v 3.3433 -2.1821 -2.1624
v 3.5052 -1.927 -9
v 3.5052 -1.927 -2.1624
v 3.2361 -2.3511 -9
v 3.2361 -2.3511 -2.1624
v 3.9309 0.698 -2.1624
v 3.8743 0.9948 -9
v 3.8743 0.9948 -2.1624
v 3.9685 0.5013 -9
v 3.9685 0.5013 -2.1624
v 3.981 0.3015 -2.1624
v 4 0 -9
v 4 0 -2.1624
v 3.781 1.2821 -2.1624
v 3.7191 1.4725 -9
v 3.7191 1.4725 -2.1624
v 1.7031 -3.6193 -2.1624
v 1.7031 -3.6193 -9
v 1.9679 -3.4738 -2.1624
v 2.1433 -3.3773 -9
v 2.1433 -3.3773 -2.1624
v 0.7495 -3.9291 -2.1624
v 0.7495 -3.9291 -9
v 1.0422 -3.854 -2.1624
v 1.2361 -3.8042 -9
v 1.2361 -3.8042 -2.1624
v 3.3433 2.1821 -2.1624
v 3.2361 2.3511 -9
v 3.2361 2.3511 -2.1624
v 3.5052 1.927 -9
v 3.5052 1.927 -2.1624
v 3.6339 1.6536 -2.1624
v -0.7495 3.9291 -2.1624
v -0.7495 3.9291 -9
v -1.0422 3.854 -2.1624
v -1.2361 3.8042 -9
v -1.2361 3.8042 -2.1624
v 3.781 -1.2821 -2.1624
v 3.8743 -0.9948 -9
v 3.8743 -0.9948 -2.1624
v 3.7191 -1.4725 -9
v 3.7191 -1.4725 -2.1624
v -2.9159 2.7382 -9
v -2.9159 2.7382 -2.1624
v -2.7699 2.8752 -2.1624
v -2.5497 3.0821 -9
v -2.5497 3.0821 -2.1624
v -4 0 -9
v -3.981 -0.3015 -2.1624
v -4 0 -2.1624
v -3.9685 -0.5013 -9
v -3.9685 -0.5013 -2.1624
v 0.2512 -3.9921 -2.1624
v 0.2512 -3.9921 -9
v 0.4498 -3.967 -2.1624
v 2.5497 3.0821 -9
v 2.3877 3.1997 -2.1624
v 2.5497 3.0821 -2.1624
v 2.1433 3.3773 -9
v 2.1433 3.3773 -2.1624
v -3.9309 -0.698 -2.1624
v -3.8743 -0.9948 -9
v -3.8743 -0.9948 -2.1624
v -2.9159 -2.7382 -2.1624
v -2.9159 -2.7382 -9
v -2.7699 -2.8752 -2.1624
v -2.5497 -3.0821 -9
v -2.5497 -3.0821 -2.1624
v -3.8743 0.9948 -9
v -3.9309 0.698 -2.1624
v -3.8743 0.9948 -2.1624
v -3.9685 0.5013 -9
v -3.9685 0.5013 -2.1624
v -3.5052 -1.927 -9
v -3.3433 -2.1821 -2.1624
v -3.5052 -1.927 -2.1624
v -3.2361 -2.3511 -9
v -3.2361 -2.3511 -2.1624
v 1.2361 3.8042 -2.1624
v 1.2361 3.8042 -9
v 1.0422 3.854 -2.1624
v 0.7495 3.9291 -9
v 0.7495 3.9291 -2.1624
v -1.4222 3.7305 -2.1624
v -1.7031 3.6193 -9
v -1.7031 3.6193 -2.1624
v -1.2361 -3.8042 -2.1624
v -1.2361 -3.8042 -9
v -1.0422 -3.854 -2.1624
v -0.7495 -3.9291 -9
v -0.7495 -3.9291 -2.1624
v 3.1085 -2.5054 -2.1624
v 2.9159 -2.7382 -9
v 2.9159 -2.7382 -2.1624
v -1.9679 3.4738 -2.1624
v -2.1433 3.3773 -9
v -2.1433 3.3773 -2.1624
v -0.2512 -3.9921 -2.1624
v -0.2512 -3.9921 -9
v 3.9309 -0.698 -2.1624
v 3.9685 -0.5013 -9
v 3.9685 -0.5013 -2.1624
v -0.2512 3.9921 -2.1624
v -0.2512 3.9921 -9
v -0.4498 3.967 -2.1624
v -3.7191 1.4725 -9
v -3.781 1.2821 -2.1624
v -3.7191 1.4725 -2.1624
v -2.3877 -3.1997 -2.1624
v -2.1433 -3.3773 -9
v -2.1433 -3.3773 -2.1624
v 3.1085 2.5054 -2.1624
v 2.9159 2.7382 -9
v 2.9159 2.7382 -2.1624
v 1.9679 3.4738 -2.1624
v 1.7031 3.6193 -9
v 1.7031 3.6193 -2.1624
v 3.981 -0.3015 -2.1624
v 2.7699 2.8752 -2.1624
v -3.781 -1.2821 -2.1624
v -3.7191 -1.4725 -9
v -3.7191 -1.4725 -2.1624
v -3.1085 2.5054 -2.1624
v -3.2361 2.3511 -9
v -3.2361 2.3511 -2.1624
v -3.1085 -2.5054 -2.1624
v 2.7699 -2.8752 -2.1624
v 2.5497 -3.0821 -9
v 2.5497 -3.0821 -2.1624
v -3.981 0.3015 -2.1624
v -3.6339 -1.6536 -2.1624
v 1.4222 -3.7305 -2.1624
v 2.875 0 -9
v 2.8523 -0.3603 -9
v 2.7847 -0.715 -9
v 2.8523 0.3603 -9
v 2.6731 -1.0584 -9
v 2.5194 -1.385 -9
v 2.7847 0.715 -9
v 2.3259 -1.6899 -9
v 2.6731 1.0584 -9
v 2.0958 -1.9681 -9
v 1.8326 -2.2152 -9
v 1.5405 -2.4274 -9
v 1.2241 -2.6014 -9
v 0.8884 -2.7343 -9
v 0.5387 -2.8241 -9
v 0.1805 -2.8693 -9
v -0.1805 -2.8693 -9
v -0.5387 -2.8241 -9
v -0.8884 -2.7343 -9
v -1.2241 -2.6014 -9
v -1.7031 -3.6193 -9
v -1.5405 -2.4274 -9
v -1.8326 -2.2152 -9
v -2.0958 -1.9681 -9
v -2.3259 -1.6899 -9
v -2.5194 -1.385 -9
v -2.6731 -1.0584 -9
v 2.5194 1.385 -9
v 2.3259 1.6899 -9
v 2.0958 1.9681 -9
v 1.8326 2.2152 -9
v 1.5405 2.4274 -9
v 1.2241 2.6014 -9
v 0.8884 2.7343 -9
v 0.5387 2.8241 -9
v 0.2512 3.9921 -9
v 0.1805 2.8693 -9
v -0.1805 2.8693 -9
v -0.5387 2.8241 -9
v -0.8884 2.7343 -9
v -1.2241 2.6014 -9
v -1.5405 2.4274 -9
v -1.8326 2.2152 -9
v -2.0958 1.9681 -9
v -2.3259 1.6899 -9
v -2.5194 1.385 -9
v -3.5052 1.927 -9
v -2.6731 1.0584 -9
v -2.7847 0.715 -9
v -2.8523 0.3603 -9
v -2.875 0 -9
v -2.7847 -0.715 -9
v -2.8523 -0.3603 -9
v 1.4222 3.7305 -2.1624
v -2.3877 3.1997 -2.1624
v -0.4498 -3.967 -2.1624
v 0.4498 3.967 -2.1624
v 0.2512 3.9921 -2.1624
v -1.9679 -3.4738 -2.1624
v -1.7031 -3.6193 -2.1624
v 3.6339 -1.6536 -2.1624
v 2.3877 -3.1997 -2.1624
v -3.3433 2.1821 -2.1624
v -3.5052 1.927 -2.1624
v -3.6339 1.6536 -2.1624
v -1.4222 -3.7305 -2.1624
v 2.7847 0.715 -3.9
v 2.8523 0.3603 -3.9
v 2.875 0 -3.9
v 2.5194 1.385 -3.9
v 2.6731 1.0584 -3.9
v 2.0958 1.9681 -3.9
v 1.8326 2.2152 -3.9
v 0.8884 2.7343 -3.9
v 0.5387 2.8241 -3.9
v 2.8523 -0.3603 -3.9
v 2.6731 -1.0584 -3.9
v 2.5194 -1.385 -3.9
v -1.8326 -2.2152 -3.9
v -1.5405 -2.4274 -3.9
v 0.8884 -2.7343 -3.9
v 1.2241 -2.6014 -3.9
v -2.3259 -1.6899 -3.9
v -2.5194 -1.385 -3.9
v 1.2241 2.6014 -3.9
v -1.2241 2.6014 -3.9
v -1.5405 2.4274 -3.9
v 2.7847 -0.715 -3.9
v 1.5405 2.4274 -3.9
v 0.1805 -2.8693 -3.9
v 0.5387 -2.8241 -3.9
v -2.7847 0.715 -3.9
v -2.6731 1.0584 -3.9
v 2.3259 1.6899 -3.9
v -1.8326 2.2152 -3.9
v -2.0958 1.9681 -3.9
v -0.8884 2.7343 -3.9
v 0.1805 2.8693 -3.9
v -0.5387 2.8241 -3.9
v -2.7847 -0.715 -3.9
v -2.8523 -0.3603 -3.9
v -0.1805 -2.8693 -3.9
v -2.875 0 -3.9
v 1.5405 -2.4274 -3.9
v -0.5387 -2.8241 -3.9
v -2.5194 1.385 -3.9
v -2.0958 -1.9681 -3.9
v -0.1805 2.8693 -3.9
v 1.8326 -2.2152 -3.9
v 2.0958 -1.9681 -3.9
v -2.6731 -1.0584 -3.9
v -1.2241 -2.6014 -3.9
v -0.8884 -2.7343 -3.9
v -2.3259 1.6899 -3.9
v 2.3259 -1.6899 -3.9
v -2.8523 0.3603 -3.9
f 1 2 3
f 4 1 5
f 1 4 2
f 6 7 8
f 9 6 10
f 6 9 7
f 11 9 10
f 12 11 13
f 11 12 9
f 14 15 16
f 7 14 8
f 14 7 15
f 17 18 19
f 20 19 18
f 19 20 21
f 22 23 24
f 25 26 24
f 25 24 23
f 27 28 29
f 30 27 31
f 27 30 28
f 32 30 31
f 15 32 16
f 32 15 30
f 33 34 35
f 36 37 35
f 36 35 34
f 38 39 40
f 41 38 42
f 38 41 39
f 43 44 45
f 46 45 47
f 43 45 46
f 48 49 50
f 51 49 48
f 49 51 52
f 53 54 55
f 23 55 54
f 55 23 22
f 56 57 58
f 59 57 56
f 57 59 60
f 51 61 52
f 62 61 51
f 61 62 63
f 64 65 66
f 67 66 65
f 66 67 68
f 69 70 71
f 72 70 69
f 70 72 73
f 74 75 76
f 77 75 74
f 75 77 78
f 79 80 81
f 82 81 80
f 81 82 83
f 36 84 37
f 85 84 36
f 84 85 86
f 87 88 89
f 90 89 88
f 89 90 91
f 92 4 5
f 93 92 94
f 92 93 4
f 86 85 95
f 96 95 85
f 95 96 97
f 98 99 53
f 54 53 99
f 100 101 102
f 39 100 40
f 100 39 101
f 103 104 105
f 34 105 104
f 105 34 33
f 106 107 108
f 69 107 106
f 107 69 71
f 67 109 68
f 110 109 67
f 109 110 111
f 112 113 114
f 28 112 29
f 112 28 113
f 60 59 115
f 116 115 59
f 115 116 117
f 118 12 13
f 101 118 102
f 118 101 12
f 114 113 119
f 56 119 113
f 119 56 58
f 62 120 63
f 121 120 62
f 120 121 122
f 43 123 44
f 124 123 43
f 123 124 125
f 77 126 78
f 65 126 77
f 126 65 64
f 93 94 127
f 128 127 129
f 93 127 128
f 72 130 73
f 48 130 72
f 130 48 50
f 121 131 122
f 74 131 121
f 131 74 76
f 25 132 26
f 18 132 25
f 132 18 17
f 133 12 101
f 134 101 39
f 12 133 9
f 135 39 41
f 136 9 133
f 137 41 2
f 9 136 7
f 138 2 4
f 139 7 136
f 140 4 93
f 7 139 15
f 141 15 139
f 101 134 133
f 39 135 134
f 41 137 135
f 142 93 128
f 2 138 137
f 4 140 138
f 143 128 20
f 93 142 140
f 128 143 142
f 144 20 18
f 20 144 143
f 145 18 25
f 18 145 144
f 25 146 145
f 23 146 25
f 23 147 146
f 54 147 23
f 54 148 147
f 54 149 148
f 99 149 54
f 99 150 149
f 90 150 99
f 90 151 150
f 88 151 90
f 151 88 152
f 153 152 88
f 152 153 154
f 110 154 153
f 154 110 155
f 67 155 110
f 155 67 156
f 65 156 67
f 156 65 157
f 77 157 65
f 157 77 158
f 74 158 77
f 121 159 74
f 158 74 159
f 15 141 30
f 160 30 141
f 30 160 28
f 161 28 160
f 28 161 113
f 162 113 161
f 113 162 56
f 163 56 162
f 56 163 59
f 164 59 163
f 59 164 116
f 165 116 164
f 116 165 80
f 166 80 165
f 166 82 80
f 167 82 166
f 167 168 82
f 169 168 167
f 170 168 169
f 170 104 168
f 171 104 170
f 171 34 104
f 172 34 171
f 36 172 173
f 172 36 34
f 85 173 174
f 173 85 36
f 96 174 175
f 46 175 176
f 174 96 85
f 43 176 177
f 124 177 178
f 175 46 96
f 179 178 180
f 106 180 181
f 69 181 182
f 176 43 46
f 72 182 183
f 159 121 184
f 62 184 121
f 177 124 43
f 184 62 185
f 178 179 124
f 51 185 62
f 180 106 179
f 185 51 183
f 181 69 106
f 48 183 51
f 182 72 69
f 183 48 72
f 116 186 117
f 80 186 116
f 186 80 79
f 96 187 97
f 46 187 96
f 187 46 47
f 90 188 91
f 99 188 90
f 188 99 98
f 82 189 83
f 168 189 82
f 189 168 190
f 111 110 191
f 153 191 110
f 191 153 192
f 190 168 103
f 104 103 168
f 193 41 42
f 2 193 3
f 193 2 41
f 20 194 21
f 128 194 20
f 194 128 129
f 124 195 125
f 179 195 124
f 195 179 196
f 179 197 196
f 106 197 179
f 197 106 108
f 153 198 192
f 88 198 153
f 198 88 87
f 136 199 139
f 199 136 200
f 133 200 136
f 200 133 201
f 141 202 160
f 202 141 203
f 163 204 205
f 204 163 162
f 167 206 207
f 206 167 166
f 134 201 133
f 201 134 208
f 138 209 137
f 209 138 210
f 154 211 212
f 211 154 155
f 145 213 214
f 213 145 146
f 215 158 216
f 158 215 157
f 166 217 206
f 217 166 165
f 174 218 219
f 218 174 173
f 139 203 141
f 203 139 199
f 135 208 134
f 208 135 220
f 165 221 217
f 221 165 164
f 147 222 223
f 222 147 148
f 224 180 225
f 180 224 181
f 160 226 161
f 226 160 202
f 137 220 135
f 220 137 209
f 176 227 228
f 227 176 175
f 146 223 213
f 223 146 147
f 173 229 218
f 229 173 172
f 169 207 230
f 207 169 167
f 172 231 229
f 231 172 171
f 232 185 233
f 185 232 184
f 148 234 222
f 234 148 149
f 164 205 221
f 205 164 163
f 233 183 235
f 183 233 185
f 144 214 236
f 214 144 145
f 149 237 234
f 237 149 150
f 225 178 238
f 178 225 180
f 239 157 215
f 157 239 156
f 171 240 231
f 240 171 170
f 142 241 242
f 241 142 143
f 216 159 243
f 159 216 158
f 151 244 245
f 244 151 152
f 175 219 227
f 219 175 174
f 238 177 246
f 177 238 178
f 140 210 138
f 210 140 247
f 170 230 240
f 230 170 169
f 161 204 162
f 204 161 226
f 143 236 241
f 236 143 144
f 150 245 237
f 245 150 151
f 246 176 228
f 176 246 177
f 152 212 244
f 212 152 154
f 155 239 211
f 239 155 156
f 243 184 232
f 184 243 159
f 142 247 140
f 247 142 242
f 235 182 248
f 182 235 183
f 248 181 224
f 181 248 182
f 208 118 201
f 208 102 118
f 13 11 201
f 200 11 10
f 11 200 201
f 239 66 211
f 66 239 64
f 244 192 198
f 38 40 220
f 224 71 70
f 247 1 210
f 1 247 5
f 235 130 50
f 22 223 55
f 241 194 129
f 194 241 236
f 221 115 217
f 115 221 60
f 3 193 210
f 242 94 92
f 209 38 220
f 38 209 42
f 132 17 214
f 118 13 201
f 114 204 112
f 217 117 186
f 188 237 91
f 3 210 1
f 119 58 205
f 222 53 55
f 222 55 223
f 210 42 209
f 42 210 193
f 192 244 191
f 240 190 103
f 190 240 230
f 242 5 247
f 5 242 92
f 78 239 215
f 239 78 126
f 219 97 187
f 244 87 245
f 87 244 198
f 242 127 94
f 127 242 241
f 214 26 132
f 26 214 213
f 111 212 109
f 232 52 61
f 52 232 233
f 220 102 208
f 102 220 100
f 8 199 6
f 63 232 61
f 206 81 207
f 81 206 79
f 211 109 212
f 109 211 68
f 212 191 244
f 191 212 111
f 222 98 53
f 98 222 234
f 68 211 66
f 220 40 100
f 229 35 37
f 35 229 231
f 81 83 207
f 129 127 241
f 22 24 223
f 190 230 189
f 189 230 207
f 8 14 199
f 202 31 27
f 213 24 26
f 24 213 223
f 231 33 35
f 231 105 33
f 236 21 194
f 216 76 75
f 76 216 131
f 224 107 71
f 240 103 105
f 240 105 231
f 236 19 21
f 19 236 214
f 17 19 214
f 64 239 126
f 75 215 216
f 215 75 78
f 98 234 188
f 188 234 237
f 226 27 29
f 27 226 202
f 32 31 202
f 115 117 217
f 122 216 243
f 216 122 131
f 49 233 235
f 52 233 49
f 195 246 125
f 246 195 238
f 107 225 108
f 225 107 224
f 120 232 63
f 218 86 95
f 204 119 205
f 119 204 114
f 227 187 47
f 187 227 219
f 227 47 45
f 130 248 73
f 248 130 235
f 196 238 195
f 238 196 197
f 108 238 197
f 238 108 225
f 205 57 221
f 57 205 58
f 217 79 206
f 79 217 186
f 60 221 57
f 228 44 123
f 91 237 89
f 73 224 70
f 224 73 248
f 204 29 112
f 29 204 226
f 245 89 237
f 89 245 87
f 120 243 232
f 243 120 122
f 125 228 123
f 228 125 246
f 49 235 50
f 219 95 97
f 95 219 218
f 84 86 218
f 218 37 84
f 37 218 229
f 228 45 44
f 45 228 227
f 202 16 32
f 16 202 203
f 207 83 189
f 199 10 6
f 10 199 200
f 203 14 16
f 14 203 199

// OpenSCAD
$fn = 50;

difference() {
	union() {
		translate(v = [0, 0, -9.0]) {
			cylinder(h = 12, r = 4.0);
		}
		#translate(v = [0, 0, -12.0]) {
			cylinder(h = 12, r = 2.875);
		}
	}
	union() {
		translate(v = [0, 0, 0]) {
			rotate(a = [0, 0, 0]) {
				difference() {
					union() {
						translate(v = [0, 0, -12.0]) {
							cylinder(h = 12, r = 2.6);
						}
						translate(v = [0, 0, -3.9]) {
							cylinder(h = 3.9, r1 = 2.875, r2 = 5.4);
						}
						translate(v = [0, 0, -12.0]) {
							cylinder(h = 12, r = 2.875);
						}
						translate(v = [0, 0, -12.0]) {
							cylinder(h = 12, r = 2.6);
						}
					}
					union();
				}
			}
		}
		#cylinder(h = 3, r = 5.0);
	}
}
